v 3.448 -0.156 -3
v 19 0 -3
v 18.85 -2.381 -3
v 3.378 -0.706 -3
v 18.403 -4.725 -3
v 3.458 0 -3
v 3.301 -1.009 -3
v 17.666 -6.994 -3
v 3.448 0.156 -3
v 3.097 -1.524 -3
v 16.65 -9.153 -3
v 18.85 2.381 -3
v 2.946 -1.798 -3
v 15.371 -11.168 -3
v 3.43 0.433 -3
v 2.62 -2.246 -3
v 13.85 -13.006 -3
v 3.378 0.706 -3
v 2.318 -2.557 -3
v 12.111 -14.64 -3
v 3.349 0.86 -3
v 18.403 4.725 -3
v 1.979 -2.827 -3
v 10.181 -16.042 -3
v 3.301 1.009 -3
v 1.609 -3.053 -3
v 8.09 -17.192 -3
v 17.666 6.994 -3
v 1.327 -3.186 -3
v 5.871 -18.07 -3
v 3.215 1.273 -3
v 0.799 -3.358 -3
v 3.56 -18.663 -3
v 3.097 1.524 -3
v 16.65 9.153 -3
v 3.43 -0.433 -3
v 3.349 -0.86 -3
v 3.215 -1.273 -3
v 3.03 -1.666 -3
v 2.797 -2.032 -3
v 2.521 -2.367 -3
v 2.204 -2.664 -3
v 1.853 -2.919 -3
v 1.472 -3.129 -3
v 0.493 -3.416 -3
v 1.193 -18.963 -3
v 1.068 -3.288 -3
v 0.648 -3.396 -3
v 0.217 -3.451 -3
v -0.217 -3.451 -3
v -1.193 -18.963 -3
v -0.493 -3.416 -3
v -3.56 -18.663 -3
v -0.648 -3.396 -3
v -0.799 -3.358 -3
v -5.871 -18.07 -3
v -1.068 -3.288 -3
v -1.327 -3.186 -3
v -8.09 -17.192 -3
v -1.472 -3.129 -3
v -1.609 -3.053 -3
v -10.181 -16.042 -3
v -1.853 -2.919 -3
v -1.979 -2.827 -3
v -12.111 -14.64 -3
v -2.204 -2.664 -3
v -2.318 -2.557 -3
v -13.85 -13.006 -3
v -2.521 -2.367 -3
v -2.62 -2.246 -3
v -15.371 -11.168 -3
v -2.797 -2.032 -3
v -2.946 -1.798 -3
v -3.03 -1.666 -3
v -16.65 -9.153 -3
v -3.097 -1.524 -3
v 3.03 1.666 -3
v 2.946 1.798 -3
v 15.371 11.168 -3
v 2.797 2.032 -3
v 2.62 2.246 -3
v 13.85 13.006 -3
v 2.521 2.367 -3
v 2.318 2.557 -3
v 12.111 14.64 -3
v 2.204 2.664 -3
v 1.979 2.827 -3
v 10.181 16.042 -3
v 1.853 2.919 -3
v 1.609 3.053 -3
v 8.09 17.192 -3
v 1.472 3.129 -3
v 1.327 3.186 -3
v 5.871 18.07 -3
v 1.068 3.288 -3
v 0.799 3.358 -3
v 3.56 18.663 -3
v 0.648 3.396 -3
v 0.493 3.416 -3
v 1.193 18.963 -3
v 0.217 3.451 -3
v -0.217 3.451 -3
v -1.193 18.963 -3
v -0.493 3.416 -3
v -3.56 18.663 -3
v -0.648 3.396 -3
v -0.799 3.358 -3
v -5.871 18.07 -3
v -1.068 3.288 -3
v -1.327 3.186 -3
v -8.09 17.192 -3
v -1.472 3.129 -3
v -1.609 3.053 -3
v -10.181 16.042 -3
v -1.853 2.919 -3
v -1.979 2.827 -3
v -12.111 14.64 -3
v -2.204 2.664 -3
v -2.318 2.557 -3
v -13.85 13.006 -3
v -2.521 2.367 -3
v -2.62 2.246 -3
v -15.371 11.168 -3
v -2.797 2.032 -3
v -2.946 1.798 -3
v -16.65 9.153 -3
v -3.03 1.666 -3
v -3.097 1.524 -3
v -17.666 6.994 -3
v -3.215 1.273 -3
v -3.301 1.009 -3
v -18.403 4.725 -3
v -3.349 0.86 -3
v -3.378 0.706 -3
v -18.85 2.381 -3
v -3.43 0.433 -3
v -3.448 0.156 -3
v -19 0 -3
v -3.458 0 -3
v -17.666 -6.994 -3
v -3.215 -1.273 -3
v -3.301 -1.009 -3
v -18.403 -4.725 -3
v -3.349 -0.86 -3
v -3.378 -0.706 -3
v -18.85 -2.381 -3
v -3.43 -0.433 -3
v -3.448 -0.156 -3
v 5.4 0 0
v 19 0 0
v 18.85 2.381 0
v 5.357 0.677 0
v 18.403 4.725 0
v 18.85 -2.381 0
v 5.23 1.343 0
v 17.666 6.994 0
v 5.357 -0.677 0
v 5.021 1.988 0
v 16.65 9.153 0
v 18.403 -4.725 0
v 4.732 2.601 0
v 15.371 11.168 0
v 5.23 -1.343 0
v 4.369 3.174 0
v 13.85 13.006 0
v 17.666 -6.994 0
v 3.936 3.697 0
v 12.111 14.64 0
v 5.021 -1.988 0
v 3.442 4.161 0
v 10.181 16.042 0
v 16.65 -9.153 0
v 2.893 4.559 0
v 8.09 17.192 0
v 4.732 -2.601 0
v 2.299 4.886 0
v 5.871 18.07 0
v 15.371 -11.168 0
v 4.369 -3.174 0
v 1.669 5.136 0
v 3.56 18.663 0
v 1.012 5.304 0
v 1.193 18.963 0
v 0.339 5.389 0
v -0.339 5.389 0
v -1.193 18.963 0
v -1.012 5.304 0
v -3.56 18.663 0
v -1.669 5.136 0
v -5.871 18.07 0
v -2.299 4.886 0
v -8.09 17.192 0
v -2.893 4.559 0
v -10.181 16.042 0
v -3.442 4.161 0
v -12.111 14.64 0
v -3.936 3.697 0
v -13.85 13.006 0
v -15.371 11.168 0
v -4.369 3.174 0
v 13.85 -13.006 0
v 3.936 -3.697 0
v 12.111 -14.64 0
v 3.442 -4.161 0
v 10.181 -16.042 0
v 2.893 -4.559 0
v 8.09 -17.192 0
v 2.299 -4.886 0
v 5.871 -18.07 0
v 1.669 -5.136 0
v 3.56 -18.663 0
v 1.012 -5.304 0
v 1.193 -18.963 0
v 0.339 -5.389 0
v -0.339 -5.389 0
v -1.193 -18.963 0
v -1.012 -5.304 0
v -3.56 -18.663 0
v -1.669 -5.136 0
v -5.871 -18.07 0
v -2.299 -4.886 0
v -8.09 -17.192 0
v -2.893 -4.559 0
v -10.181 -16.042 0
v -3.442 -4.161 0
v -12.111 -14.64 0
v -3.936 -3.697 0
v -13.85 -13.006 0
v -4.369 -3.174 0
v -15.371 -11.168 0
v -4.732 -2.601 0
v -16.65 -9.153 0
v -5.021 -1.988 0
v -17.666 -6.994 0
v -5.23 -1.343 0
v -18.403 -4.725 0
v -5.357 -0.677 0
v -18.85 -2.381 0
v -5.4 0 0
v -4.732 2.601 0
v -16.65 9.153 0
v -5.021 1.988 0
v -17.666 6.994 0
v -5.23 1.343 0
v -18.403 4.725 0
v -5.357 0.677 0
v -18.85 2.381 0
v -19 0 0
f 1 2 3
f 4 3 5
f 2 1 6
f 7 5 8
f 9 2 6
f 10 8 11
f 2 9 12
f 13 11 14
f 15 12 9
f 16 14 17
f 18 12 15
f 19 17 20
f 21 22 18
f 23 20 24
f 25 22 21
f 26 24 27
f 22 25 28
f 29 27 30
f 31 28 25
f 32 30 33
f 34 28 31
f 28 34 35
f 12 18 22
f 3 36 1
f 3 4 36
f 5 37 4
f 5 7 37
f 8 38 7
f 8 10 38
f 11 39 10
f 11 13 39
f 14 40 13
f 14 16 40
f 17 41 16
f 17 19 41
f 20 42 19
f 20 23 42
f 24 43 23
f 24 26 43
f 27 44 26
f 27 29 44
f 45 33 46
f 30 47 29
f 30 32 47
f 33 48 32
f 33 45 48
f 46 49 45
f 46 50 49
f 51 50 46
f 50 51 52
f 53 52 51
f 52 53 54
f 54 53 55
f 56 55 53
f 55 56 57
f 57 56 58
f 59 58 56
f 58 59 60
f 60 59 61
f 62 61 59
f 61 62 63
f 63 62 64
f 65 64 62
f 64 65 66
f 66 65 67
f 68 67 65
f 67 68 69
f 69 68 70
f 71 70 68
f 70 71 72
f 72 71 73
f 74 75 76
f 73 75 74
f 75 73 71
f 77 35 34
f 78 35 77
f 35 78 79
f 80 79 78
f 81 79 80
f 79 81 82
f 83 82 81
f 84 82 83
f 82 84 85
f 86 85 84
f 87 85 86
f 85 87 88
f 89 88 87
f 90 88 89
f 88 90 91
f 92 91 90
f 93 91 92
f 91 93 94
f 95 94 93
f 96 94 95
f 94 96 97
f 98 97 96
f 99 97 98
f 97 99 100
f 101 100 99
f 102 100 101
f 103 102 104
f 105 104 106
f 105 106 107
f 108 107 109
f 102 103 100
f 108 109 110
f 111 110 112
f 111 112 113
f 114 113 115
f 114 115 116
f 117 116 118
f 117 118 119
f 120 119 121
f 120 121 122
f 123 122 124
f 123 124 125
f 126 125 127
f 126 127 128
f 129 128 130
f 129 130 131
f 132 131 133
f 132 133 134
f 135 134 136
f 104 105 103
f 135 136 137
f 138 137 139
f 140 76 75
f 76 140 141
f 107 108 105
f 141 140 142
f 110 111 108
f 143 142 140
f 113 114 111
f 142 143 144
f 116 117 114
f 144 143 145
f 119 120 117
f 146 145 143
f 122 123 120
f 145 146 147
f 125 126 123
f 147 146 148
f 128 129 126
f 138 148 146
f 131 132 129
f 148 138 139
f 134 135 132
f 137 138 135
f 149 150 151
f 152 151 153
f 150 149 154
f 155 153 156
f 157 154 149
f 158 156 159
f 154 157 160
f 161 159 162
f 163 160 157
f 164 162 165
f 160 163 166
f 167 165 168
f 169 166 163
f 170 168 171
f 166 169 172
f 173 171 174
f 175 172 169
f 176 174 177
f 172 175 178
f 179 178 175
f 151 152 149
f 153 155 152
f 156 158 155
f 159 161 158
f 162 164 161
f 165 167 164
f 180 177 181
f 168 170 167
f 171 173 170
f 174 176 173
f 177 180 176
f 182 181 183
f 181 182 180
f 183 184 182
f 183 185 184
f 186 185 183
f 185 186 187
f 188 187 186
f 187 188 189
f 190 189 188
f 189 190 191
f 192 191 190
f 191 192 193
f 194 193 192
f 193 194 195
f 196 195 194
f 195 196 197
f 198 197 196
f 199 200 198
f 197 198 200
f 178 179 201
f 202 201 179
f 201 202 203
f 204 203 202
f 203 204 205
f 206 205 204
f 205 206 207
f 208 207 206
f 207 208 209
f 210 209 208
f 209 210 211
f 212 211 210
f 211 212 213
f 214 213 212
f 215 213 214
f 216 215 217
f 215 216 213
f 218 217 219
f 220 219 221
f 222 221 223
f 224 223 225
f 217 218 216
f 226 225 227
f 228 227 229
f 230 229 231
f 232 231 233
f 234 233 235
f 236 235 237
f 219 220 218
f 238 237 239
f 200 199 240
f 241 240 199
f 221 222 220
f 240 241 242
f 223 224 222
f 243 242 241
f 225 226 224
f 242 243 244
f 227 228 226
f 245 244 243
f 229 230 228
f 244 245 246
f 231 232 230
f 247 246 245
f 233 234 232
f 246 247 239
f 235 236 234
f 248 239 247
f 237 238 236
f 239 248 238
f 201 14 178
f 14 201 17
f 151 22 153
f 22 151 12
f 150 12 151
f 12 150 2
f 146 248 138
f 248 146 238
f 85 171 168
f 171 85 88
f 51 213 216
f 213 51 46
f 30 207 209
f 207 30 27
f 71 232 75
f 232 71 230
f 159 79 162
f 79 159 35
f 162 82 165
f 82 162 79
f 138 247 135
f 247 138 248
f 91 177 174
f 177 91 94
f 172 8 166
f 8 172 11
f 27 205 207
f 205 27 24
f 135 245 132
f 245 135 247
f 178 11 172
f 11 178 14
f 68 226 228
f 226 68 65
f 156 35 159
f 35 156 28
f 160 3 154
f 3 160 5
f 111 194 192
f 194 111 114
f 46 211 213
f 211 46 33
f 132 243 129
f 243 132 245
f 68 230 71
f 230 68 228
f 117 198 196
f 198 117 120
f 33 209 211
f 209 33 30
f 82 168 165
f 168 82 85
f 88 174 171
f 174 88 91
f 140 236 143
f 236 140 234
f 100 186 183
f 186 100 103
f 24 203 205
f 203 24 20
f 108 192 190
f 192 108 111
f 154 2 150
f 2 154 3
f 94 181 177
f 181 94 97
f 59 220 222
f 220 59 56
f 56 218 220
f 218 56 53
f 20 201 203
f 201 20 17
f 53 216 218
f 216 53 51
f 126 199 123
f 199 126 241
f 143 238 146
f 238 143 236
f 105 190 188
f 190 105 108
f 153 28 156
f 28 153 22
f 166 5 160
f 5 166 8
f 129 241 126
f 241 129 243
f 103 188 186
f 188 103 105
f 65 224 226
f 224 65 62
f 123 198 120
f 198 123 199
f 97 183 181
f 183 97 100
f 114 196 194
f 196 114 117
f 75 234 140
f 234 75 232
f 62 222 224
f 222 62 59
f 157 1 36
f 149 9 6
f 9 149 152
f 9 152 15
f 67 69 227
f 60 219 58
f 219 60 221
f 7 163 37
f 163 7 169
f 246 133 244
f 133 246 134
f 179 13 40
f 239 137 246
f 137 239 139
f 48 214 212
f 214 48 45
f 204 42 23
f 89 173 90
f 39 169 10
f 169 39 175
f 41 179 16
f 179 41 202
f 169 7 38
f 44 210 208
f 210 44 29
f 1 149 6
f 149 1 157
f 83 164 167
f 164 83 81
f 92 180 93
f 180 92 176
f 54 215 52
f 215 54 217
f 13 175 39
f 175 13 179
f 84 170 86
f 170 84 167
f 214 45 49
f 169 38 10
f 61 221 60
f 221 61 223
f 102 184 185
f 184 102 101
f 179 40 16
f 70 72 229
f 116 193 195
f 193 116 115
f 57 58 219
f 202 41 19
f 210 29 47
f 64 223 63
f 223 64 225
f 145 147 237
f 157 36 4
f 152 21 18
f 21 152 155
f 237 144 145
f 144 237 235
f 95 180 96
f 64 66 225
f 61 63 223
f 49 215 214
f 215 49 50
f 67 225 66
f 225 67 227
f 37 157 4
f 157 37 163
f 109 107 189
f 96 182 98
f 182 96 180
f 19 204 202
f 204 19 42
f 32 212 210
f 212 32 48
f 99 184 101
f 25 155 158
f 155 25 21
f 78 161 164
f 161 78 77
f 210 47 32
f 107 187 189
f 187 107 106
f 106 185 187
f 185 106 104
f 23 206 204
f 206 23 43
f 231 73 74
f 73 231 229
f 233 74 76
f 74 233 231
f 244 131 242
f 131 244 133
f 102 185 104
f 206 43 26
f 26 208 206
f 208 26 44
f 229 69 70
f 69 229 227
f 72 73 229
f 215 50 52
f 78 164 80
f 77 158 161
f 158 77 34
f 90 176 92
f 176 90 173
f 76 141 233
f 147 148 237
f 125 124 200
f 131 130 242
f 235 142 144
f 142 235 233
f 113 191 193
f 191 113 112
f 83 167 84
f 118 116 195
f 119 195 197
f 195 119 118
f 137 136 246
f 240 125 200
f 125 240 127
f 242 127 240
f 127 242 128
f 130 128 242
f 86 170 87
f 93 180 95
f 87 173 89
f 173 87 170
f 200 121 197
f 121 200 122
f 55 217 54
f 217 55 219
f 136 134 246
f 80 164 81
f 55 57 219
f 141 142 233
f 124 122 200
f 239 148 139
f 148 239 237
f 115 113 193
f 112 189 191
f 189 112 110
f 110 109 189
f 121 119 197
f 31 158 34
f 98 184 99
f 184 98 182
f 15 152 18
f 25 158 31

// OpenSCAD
$fn = 50;


difference() {
	union() {
		translate(v = [0, 0, -3.0000000000]) {
			cylinder(h = 3, r = 10.0000000000);
		}
		translate(v = [0, 0, -3.0000000000]) {
			cylinder(h = 3, r = 19.0000000000);
		}
	}
	union() {
		translate(v = [0, 0, 0]) {
			rotate(a = [0, 0, 0]) {
				difference() {
					union() {
						#translate(v = [0, 0, -3.0000000000]) {
							cylinder(h = 3, r = 2.6000000000);
						}
						#translate(v = [0, 0, -3.9000000000]) {
							cylinder(h = 3.9000000000, r = 10.0000000000, r1 = 2.8750000000, r2 = 5.4000000000);
						}
						#translate(v = [0, 0, -3.0000000000]) {
							cylinder(h = 3, r = 2.8750000000);
						}
						#translate(v = [0, 0, -3.0000000000]) {
							cylinder(h = 3, r = 2.6000000000);
						}
					}
					union();
				}
			}
		}
	}
}
